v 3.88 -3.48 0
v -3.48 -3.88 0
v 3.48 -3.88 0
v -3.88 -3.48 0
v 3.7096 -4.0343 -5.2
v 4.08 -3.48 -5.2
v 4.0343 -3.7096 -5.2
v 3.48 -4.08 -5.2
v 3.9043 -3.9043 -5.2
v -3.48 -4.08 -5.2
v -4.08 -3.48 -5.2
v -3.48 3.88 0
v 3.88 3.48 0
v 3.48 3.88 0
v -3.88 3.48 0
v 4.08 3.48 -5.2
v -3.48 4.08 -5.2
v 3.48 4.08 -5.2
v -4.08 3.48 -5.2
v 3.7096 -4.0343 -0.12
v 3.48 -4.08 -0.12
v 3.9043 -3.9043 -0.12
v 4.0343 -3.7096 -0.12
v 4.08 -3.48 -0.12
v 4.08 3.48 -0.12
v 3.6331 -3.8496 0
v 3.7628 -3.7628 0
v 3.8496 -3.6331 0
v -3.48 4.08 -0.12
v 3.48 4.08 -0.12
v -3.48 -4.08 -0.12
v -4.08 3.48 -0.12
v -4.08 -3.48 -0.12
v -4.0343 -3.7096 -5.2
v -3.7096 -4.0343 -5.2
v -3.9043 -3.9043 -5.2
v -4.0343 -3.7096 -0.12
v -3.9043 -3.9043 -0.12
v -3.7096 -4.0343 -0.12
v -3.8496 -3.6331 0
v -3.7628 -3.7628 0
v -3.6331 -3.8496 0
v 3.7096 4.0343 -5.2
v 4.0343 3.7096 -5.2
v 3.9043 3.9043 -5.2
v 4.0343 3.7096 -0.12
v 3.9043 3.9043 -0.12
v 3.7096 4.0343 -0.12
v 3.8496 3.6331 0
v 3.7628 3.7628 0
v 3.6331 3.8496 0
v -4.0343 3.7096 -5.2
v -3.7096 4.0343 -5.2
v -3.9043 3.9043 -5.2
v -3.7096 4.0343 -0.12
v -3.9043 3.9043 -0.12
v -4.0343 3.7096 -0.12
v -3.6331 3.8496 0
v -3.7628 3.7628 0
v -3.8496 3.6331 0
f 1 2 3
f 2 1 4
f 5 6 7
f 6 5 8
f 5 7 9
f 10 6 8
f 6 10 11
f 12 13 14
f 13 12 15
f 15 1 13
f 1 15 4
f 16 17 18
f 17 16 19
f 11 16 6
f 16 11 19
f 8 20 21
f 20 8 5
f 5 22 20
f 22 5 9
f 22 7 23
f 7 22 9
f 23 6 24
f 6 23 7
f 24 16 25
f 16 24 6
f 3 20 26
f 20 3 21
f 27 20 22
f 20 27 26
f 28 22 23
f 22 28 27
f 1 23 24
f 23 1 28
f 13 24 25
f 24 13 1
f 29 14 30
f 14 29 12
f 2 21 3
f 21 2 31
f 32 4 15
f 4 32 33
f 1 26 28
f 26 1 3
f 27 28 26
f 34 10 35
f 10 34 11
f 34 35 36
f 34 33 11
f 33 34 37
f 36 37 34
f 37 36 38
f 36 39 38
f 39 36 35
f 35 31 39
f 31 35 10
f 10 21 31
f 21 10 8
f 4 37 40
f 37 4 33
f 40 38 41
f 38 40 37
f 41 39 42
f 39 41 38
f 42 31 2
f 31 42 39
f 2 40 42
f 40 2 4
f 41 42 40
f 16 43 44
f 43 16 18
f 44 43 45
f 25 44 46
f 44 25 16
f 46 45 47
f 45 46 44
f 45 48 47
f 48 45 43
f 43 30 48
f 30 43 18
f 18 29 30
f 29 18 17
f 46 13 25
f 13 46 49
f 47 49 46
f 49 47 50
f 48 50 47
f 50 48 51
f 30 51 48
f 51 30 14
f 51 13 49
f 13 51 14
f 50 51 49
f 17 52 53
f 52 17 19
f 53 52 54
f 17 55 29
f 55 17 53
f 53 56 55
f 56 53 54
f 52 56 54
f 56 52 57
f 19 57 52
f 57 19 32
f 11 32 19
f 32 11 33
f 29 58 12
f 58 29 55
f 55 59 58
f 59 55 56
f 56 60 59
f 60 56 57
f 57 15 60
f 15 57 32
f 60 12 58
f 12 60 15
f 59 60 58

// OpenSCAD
// file: ../p/1-4cyli.scad
use <../lib.scad>
function ldraw_lib__1_4cyli() = [
// 0 Cylinder 0.25
// 0 Name: 1-4cyli.dat
// 0 Author: James Jessiman
// 0 !LDRAW_ORG Primitive UPDATE 2012-01
// 0 !LICENSE Licensed under CC BY 4.0 : see CAreadme.txt
// 
// 0 BFC CERTIFY CCW
  [0,"BFC","CERTIFY"],
  [0,"BFC","CCW"],
// 
// 0 !HISTORY 2002-03-23 [sbliss] Added BFC statement.
// 0 !HISTORY 2002-04-25 [PTadmin] Official Update 2002-02
// 0 !HISTORY 2007-06-22 [PTadmin] Header formatted for Contributor Agreement
// 0 !HISTORY 2008-07-01 [PTadmin] Official Update 2008-01
// 0 !HISTORY 2012-02-16 [Philo] Changed to CCW
// 0 !HISTORY 2012-03-30 [PTadmin] Official Update 2012-01
// 
// 
// 4 16 1 1 0 0.9239 1 0.3827 0.9239 0 0.3827 1 0 0
  [4,16,1,1,0,0.9239,1,0.3827,0.9239,0,0.3827,1,0,0],
// 5 24 1 0 0 1 1 0 0.9239 0 0.3827 1 0 -1
  [5,24,1,0,0,1,1,0,0.9239,0,0.3827,1,0,-1],
// 4 16 0.9239 1 0.3827 0.7071 1 0.7071 0.7071 0 0.7071 0.9239 0 0.3827
  [4,16,0.9239,1,0.3827,0.7071,1,0.7071,0.7071,0,0.7071,0.9239,0,0.3827],
// 5 24 0.9239 0 0.3827 0.9239 1 0.3827 0.7071 0 0.7071 1 0 0
  [5,24,0.9239,0,0.3827,0.9239,1,0.3827,0.7071,0,0.7071,1,0,0],
// 4 16 0.7071 1 0.7071 0.3827 1 0.9239 0.3827 0 0.9239 0.7071 0 0.7071
  [4,16,0.7071,1,0.7071,0.3827,1,0.9239,0.3827,0,0.9239,0.7071,0,0.7071],
// 5 24 0.7071 0 0.7071 0.7071 1 0.7071 0.3827 0 0.9239 0.9239 0 0.3827
  [5,24,0.7071,0,0.7071,0.7071,1,0.7071,0.3827,0,0.9239,0.9239,0,0.3827],
// 4 16 0.3827 1 0.9239 0 1 1 0 0 1 0.3827 0 0.9239
  [4,16,0.3827,1,0.9239,0,1,1,0,0,1,0.3827,0,0.9239],
// 5 24 0.3827 0 0.9239 0.3827 1 0.9239 0 0 1 0.7071 0 0.7071
  [5,24,0.3827,0,0.9239,0.3827,1,0.9239,0,0,1,0.7071,0,0.7071],
// 5 24 0 0 1 0 1 1 0.3827 0 0.9239 -1 0 1
  [5,24,0,0,1,0,1,1,0.3827,0,0.9239,-1,0,1],
];
module ldraw_lib__1_4cyli(step=0, col=false, unit=2/5, alt=false, line=0.2, solid=!$preview)
    makepoly(ldraw_lib__1_4cyli(), step=step, col=col, unit=unit, alt=alt, line=line, solid=solid);
ldraw_lib__1_4cyli(line=0.2);
// file: ../p/rect2p.scad
use <../lib.scad>
function ldraw_lib__rect2p() = [
// 0 Rectangle with 2 Parallel Edges
// 0 Name: rect2p.dat
// 0 Author: Donald Sutter [technog]
// 0 !LDRAW_ORG Primitive UPDATE 2010-01
// 0 !LICENSE Licensed under CC BY 4.0 : see CAreadme.txt
// 
// 0 BFC CERTIFY CCW
  [0,"BFC","CERTIFY"],
  [0,"BFC","CCW"],
// 
// 0 !HISTORY 2003-08-01 [PTadmin] Official Update 2003-02
// 0 !HISTORY 2007-06-24 [PTadmin] Header formatted for Contributor Agreement
// 0 !HISTORY 2008-07-01 [PTadmin] Official Update 2008-01
// 0 !HISTORY 2010-01-17 [mikeheide] changed winding to CCW
// 0 !HISTORY 2010-04-05 [PTadmin] Official Update 2010-01
// 
// 
// 2 24 1 0 1 -1 0 1
  [2,24,1,0,1,-1,0,1],
// 2 24 -1 0 -1 1 0 -1
  [2,24,-1,0,-1,1,0,-1],
// 4 16 -1 0 1 -1 0 -1 1 0 -1 1 0 1
  [4,16,-1,0,1,-1,0,-1,1,0,-1,1,0,1],
// 0
];
module ldraw_lib__rect2p(step=0, col=false, unit=2/5, alt=false, line=0.2, solid=!$preview)
    makepoly(ldraw_lib__rect2p(), step=step, col=col, unit=unit, alt=alt, line=line, solid=solid);
ldraw_lib__rect2p(line=0.2);
// file: ../p/rect1.scad
use <../lib.scad>
function ldraw_lib__rect1() = [
// 0 Rectangle with 1 Edge
// 0 Name: rect1.dat
// 0 Author: Chris Dee [cwdee]
// 0 !LDRAW_ORG Primitive UPDATE 2010-01
// 0 !LICENSE Licensed under CC BY 4.0 : see CAreadme.txt
// 
// 0 BFC CERTIFY CCW
  [0,"BFC","CERTIFY"],
  [0,"BFC","CCW"],
// 
// 0 !HISTORY 2003-12-19 [PTadmin] Official Update 2003-03
// 0 !HISTORY 2007-06-24 [PTadmin] Header formatted for Contributor Agreement
// 0 !HISTORY 2008-07-01 [PTadmin] Official Update 2008-01
// 0 !HISTORY 2010-01-17 [mikeheide] changed winding to CCW
// 0 !HISTORY 2010-04-05 [PTadmin] Official Update 2010-01
// 
// 
// 2 24 1 0 -1 1 0 1
  [2,24,1,0,-1,1,0,1],
// 4 16 -1 0 1 -1 0 -1 1 0 -1 1 0 1
  [4,16,-1,0,1,-1,0,-1,1,0,-1,1,0,1],
// 0
];
module ldraw_lib__rect1(step=0, col=false, unit=2/5, alt=false, line=0.2, solid=!$preview)
    makepoly(ldraw_lib__rect1(), step=step, col=col, unit=unit, alt=alt, line=line, solid=solid);
ldraw_lib__rect1(line=0.2);
// file: ../p/1-4edge.scad
use <../lib.scad>
function ldraw_lib__1_4edge() = [
// 0 Circle 0.25
// 0 Name: 1-4edge.dat
// 0 Author: James Jessiman
// 0 !LDRAW_ORG Primitive UPDATE 2017-01
// 0 !LICENSE Licensed under CC BY 4.0 : see CAreadme.txt
// 
// 0 BFC CERTIFY CCW
  [0,"BFC","CERTIFY"],
  [0,"BFC","CCW"],
// 
// 0 !HISTORY 2007-06-22 [PTadmin] Header formatted for Contributor Agreement
// 0 !HISTORY 2008-07-01 [PTadmin] Official Update 2008-01
// 0 !HISTORY 2017-01-15 [Steffen] BFCed
// 0 !HISTORY 2017-12-30 [PTadmin] Official Update 2017-01
// 
// 
// 2 24 1 0 0 0.9239 0 0.3827
  [2,24,1,0,0,0.9239,0,0.3827],
// 2 24 0.9239 0 0.3827 0.7071 0 0.7071
  [2,24,0.9239,0,0.3827,0.7071,0,0.7071],
// 2 24 0.7071 0 0.7071 0.3827 0 0.9239
  [2,24,0.7071,0,0.7071,0.3827,0,0.9239],
// 2 24 0.3827 0 0.9239 0 0 1
  [2,24,0.3827,0,0.9239,0,0,1],
];
module ldraw_lib__1_4edge(step=0, col=false, unit=2/5, alt=false, line=0.2, solid=!$preview)
    makepoly(ldraw_lib__1_4edge(), step=step, col=col, unit=unit, alt=alt, line=line, solid=solid);
ldraw_lib__1_4edge(line=0.2);
// file: ../p/1-4cylo.scad
use <../lib.scad>
use <1-4cyli.scad>
use <1-4edge.scad>
function ldraw_lib__1_4cylo() = [
// 0 Cylinder Open 0.25
// 0 Name: 1-4cylo.dat
// 0 Author: Max Martin Richter [MMR1988]
// 0 !LDRAW_ORG Primitive UPDATE 2010-03
// 0 !LICENSE Licensed under CC BY 4.0 : see CAreadme.txt
// 
// 0 BFC CERTIFY CCW
  [0,"BFC","CERTIFY"],
  [0,"BFC","CCW"],
// 
// 0 !HISTORY 2010-12-31 [PTadmin] Official Update 2010-03
// 
// 
// 1 16 0 0 0 1 0 0 0 1 0 0 0 1 1-4edge.dat
  [1,16,0,0,0,1,0,0,0,1,0,0,0,1, ldraw_lib__1_4edge()],
// 1 16 0 1 0 1 0 0 0 1 0 0 0 1 1-4edge.dat
  [1,16,0,1,0,1,0,0,0,1,0,0,0,1, ldraw_lib__1_4edge()],
// 1 16 0 0 0 1 0 0 0 1 0 0 0 1 1-4cyli.dat
  [1,16,0,0,0,1,0,0,0,1,0,0,0,1, ldraw_lib__1_4cyli()],
];
module ldraw_lib__1_4cylo(step=0, col=false, unit=2/5, alt=false, line=0.2, solid=!$preview)
    makepoly(ldraw_lib__1_4cylo(), step=step, col=col, unit=unit, alt=alt, line=line, solid=solid);
ldraw_lib__1_4cylo(line=0.2);
// file: ../p/1-4con2.scad
use <../lib.scad>
function ldraw_lib__1_4con2() = [
// 0 Cone  2 x 0.25
// 0 Name: 1-4con2.dat
// 0 Author: Steve Bliss [sbliss]
// 0 !LDRAW_ORG Primitive UPDATE 2012-01
// 0 !LICENSE Licensed under CC BY 4.0 : see CAreadme.txt
// 
// 0 BFC CERTIFY CCW
  [0,"BFC","CERTIFY"],
  [0,"BFC","CCW"],
// 
// 0 !HISTORY 1999-07-05 [PTadmin] Official Update 1999-05
// 0 !HISTORY 2002-12-11 [cwdee] Standardised title and made BFC compliant
// 0 !HISTORY 2003-06-28 [pneaster] Added missing conditional line
// 0 !HISTORY 2003-12-19 [PTadmin] Official Update 2003-03
// 0 !HISTORY 2007-06-22 [PTadmin] Header formatted for Contributor Agreement
// 0 !HISTORY 2008-07-01 [PTadmin] Official Update 2008-01
// 0 !HISTORY 2012-02-16 [Philo] Recreated CCW
// 0 !HISTORY 2012-03-30 [PTadmin] Official Update 2012-01
// 
// 
// 4 16 2 1 0 1.8478 1 0.7654 2.7717 0 1.1481 3 0 0
  [4,16,2,1,0,1.8478,1,0.7654,2.7717,0,1.1481,3,0,0],
// 4 16 1.8478 1 0.7654 1.4142 1 1.4142 2.1213 0 2.1213 2.7717 0 1.1481
  [4,16,1.8478,1,0.7654,1.4142,1,1.4142,2.1213,0,2.1213,2.7717,0,1.1481],
// 4 16 1.4142 1 1.4142 0.7654 1 1.8478 1.1481 0 2.7717 2.1213 0 2.1213
  [4,16,1.4142,1,1.4142,0.7654,1,1.8478,1.1481,0,2.7717,2.1213,0,2.1213],
// 4 16 0.7654 1 1.8478 0 1 2 0 0 3 1.1481 0 2.7717
  [4,16,0.7654,1,1.8478,0,1,2,0,0,3,1.1481,0,2.7717],
// 0 // conditional lines
// 5 24 2 1 0 3 0 0 2 1 -0.8284 1.8478 1 0.7654
  [5,24,2,1,0,3,0,0,2,1,-0.8284,1.8478,1,0.7654],
// 5 24 1.8478 1 0.7654 2.7717 0 1.1481 2 1 0 1.4142 1 1.4142
  [5,24,1.8478,1,0.7654,2.7717,0,1.1481,2,1,0,1.4142,1,1.4142],
// 5 24 1.4142 1 1.4142 2.1213 0 2.1213 1.8478 1 0.7654 0.7654 1 1.8478
  [5,24,1.4142,1,1.4142,2.1213,0,2.1213,1.8478,1,0.7654,0.7654,1,1.8478],
// 5 24 0.7654 1 1.8478 1.1481 0 2.7717 1.4142 1 1.4142 0 1 2
  [5,24,0.7654,1,1.8478,1.1481,0,2.7717,1.4142,1,1.4142,0,1,2],
// 5 24 0 1 2 0 0 3 0.7654 1 1.8478 -0.8284 1 2
  [5,24,0,1,2,0,0,3,0.7654,1,1.8478,-0.8284,1,2],
// 0 // Build by Primitive Generator 2
];
module ldraw_lib__1_4con2(step=0, col=false, unit=2/5, alt=false, line=0.2, solid=!$preview)
    makepoly(ldraw_lib__1_4con2(), step=step, col=col, unit=unit, alt=alt, line=line, solid=solid);
ldraw_lib__1_4con2(line=0.2);
// file: ../p/1-4chrd.scad
use <../lib.scad>
function ldraw_lib__1_4chrd() = [
// 0 Chord 0.25
// 0 Name: 1-4chrd.dat
// 0 Author: Tony Hafner [hafhead]
// 0 !LDRAW_ORG Primitive UPDATE 2012-02
// 0 !LICENSE Licensed under CC BY 2.0 and CC BY 4.0 : see CAreadme.txt
// 
// 0 BFC CERTIFY CCW
  [0,"BFC","CERTIFY"],
  [0,"BFC","CCW"],
// 
// 0 !HISTORY 2004-04-22 [PTadmin] Official Update 2004-02
// 0 !HISTORY 2007-10-09 [PTadmin] Header formatted for Contributor Agreement
// 0 !HISTORY 2008-07-01 [PTadmin] Official Update 2008-01
// 0 !HISTORY 2012-08-02 [MMR1988] Re-creation with PrimGen2 and Rectifier
// 0 !HISTORY 2012-08-09 [PTadmin] Official Update 2012-02
// 
// 
// 4 16 0.9239 0 0.3827 0.3827 0 0.9239 0 0 1 1 0 0
  [4,16,0.9239,0,0.3827,0.3827,0,0.9239,0,0,1,1,0,0],
// 3 16 0.7071 0 0.7071 0.3827 0 0.9239 0.9239 0 0.3827
  [3,16,0.7071,0,0.7071,0.3827,0,0.9239,0.9239,0,0.3827],
];
module ldraw_lib__1_4chrd(step=0, col=false, unit=2/5, alt=false, line=0.2, solid=!$preview)
    makepoly(ldraw_lib__1_4chrd(), step=step, col=col, unit=unit, alt=alt, line=line, solid=solid);
ldraw_lib__1_4chrd(line=0.2);
// file: 99146.scad
use <../lib.scad>
use <../p/1-4chrd.scad>
use <../p/1-4con2.scad>
use <../p/1-4cylo.scad>
use <../p/1-4edge.scad>
use <../p/rect1.scad>
use <../p/rect2p.scad>
function ldraw_lib__99146() = [
// 0 ~Electric Mindstorms EV3 Square Button
// 0 Name: 99146.dat
// 0 Author: Philippe Hurbain [Philo]
// 0 !LDRAW_ORG Part UPDATE 2013-02
// 0 !LICENSE Licensed under CC BY 4.0 : see CAreadme.txt
// 
// 0 BFC CERTIFY CCW
  [0,"BFC","CERTIFY"],
  [0,"BFC","CCW"],
// 
// 0 !HISTORY 2012-05-20 {LEGO MINDSTORMS Team} Original part shape
// 0 !HISTORY 2012-06-09 [Philo] Complete rebuild for LDraw Parts Tracker
// 0 !HISTORY 2013-12-23 [PTadmin] Official Update 2013-02
// 
// 
// 4 16 8.7 0 -9.7 9.7 0 -8.7 -9.7 0 -8.7 -8.7 0 -9.7
  [4,16,8.7,0,-9.7,9.7,0,-8.7,-9.7,0,-8.7,-8.7,0,-9.7],
// 1 16 8.7 13 -8.7 0 0 1.5 0 -0.3 0 -1.5 0 0 1-4chrd.dat
  [1,16,8.7,13,-8.7,0,0,1.5,0,-0.3,0,-1.5,0,0, ldraw_lib__1_4chrd()],
// 4 16 -8.7 13 -10.2 -10.2 13 -8.7 10.2 13 -8.7 8.7 13 -10.2
  [4,16,-8.7,13,-10.2,-10.2,13,-8.7,10.2,13,-8.7,8.7,13,-10.2],
// 4 16 -8.7 0 9.7 -9.7 0 8.7 9.7 0 8.7 8.7 0 9.7
  [4,16,-8.7,0,9.7,-9.7,0,8.7,9.7,0,8.7,8.7,0,9.7],
// 1 16 0 0 0 0 0 -9.7 0 1 0 8.7 0 0 rect2p.dat
  [1,16,0,0,0,0,0,-9.7,0,1,0,8.7,0,0, ldraw_lib__rect2p()],
// 4 16 8.7 13 10.2 10.2 13 8.7 -10.2 13 8.7 -8.7 13 10.2
  [4,16,8.7,13,10.2,10.2,13,8.7,-10.2,13,8.7,-8.7,13,10.2],
// 4 16 -10.2 13 -8.7 -10.2 13 8.7 10.2 13 8.7 10.2 13 -8.7
  [4,16,-10.2,13,-8.7,-10.2,13,8.7,10.2,13,8.7,10.2,13,-8.7],
// 1 16 8.7 0.3 -8.7 0 0 1.5 0 12.7 0 -1.5 0 0 1-4cylo.dat
  [1,16,8.7,0.3,-8.7,0,0,1.5,0,12.7,0,-1.5,0,0, ldraw_lib__1_4cylo()],
// 1 16 10.2 6.65 0 0 -1 0 0 0 -6.35 8.7 0 0 rect2p.dat
  [1,16,10.2,6.65,0,0,-1,0,0,0,-6.35,8.7,0,0, ldraw_lib__rect2p()],
// 1 16 8.7 0.3 -8.7 0 0 0.5 0 -0.3 0 -0.5 0 0 1-4con2.dat
  [1,16,8.7,0.3,-8.7,0,0,0.5,0,-0.3,0,-0.5,0,0, ldraw_lib__1_4con2()],
// 1 16 8.7 0 -8.7 0 0 1 0 0.3 0 -1 0 0 1-4edge.dat
  [1,16,8.7,0,-8.7,0,0,1,0,0.3,0,-1,0,0, ldraw_lib__1_4edge()],
// 4 16 9.7 0 -8.7 10.2 0.3 -8.7 10.2 0.3 8.7 9.7 0 8.7
  [4,16,9.7,0,-8.7,10.2,0.3,-8.7,10.2,0.3,8.7,9.7,0,8.7],
// 1 16 0 0.15 9.95 0 0 8.7 -0.15 8.7 0 -0.25 -5.22 0 rect1.dat
  [1,16,0,0.15,9.95,0,0,8.7,-0.15,8.7,0,-0.25,-5.22,0, ldraw_lib__rect1()],
// 1 16 0 0.15 -9.95 0 0 -8.7 -0.15 8.7 0 0.25 5.22 0 rect1.dat
  [1,16,0,0.15,-9.95,0,0,-8.7,-0.15,8.7,0,0.25,5.22,0, ldraw_lib__rect1()],
// 4 16 -9.7 0 8.7 -10.2 0.3 8.7 -10.2 0.3 -8.7 -9.7 0 -8.7
  [4,16,-9.7,0,8.7,-10.2,0.3,8.7,-10.2,0.3,-8.7,-9.7,0,-8.7],
// 1 16 8.7 0 -8.7 0 0 1 0 0.3 0 -1 0 0 1-4chrd.dat
  [1,16,8.7,0,-8.7,0,0,1,0,0.3,0,-1,0,0, ldraw_lib__1_4chrd()],
// 1 16 -8.7 13 -8.7 -1.5 0 0 0 -0.3 0 0 0 -1.5 1-4chrd.dat
  [1,16,-8.7,13,-8.7,-1.5,0,0,0,-0.3,0,0,0,-1.5, ldraw_lib__1_4chrd()],
// 1 16 -8.7 0.3 -8.7 -1.5 0 0 0 12.7 0 0 0 -1.5 1-4cylo.dat
  [1,16,-8.7,0.3,-8.7,-1.5,0,0,0,12.7,0,0,0,-1.5, ldraw_lib__1_4cylo()],
// 1 16 0 6.65 -10.2 8.7 0 0 0 0 -6.35 0 1 0 rect2p.dat
  [1,16,0,6.65,-10.2,8.7,0,0,0,0,-6.35,0,1,0, ldraw_lib__rect2p()],
// 1 16 -8.7 0.3 -8.7 -0.5 0 0 0 -0.3 0 0 0 -0.5 1-4con2.dat
  [1,16,-8.7,0.3,-8.7,-0.5,0,0,0,-0.3,0,0,0,-0.5, ldraw_lib__1_4con2()],
// 1 16 -8.7 0 -8.7 -1 0 0 0 0.3 0 0 0 -1 1-4edge.dat
  [1,16,-8.7,0,-8.7,-1,0,0,0,0.3,0,0,0,-1, ldraw_lib__1_4edge()],
// 1 16 -8.7 0 -8.7 -1 0 0 0 0.3 0 0 0 -1 1-4chrd.dat
  [1,16,-8.7,0,-8.7,-1,0,0,0,0.3,0,0,0,-1, ldraw_lib__1_4chrd()],
// 1 16 8.7 13 8.7 1.5 0 0 0 -0.3 0 0 0 1.5 1-4chrd.dat
  [1,16,8.7,13,8.7,1.5,0,0,0,-0.3,0,0,0,1.5, ldraw_lib__1_4chrd()],
// 1 16 8.7 0.3 8.7 1.5 0 0 0 12.7 0 0 0 1.5 1-4cylo.dat
  [1,16,8.7,0.3,8.7,1.5,0,0,0,12.7,0,0,0,1.5, ldraw_lib__1_4cylo()],
// 1 16 0 6.65 10.2 -8.7 0 0 0 0 -6.35 0 -1 0 rect2p.dat
  [1,16,0,6.65,10.2,-8.7,0,0,0,0,-6.35,0,-1,0, ldraw_lib__rect2p()],
// 1 16 8.7 0.3 8.7 0.5 0 0 0 -0.3 0 0 0 0.5 1-4con2.dat
  [1,16,8.7,0.3,8.7,0.5,0,0,0,-0.3,0,0,0,0.5, ldraw_lib__1_4con2()],
// 1 16 8.7 0 8.7 1 0 0 0 0.3 0 0 0 1 1-4edge.dat
  [1,16,8.7,0,8.7,1,0,0,0,0.3,0,0,0,1, ldraw_lib__1_4edge()],
// 1 16 8.7 0 8.7 1 0 0 0 0.3 0 0 0 1 1-4chrd.dat
  [1,16,8.7,0,8.7,1,0,0,0,0.3,0,0,0,1, ldraw_lib__1_4chrd()],
// 1 16 -8.7 13 8.7 0 0 -1.5 0 -0.3 0 1.5 0 0 1-4chrd.dat
  [1,16,-8.7,13,8.7,0,0,-1.5,0,-0.3,0,1.5,0,0, ldraw_lib__1_4chrd()],
// 1 16 -8.7 0.3 8.7 0 0 -1.5 0 12.7 0 1.5 0 0 1-4cylo.dat
  [1,16,-8.7,0.3,8.7,0,0,-1.5,0,12.7,0,1.5,0,0, ldraw_lib__1_4cylo()],
// 1 16 -10.2 6.65 0 0 1 0 0 0 -6.35 -8.7 0 0 rect2p.dat
  [1,16,-10.2,6.65,0,0,1,0,0,0,-6.35,-8.7,0,0, ldraw_lib__rect2p()],
// 1 16 -8.7 0.3 8.7 0 0 -0.5 0 -0.3 0 0.5 0 0 1-4con2.dat
  [1,16,-8.7,0.3,8.7,0,0,-0.5,0,-0.3,0,0.5,0,0, ldraw_lib__1_4con2()],
// 1 16 -8.7 0 8.7 0 0 -1 0 0.3 0 1 0 0 1-4edge.dat
  [1,16,-8.7,0,8.7,0,0,-1,0,0.3,0,1,0,0, ldraw_lib__1_4edge()],
// 1 16 -8.7 0 8.7 0 0 -1 0 0.3 0 1 0 0 1-4chrd.dat
  [1,16,-8.7,0,8.7,0,0,-1,0,0.3,0,1,0,0, ldraw_lib__1_4chrd()],
];
module ldraw_lib__99146(step=0, col=false, unit=2/5, alt=false, line=0.2, solid=!$preview)
    makepoly(ldraw_lib__99146(), step=step, col=col, unit=unit, alt=alt, line=line, solid=solid);
ldraw_lib__99146(line=0.2);
// main file
use <../lib.scad>
use <99146.scad>
function ldraw_lib__34745() = [
// 0 ~Electric Powered Up Hub On Button
// 0 Name: 34745.dat
// 0 Author: Philippe Hurbain [Philo]
// 0 !LDRAW_ORG Part UPDATE 2019-03
// 0 !LICENSE Licensed under CC BY 4.0 : see CAreadme.txt
// 
// 0 BFC CERTIFY CCW
  [0,"BFC","CERTIFY"],
  [0,"BFC","CCW"],
// 
// 0 !HISTORY 2019-12-27 [PTadmin] Official Update 2019-03
// 
// 
// 1 16 0 0 0 1 0 0 0 1 0 0 0 1 99146.dat
  [1,16,0,0,0,1,0,0,0,1,0,0,0,1, ldraw_lib__99146()],
];
module ldraw_lib__34745(step=0, col=false, unit=2/5, alt=false, line=0.2, solid=!$preview)
    makepoly(ldraw_lib__34745(), step=step, col=col, unit=unit, alt=alt, line=line, solid=solid);
ldraw_lib__34745(line=0.2);
